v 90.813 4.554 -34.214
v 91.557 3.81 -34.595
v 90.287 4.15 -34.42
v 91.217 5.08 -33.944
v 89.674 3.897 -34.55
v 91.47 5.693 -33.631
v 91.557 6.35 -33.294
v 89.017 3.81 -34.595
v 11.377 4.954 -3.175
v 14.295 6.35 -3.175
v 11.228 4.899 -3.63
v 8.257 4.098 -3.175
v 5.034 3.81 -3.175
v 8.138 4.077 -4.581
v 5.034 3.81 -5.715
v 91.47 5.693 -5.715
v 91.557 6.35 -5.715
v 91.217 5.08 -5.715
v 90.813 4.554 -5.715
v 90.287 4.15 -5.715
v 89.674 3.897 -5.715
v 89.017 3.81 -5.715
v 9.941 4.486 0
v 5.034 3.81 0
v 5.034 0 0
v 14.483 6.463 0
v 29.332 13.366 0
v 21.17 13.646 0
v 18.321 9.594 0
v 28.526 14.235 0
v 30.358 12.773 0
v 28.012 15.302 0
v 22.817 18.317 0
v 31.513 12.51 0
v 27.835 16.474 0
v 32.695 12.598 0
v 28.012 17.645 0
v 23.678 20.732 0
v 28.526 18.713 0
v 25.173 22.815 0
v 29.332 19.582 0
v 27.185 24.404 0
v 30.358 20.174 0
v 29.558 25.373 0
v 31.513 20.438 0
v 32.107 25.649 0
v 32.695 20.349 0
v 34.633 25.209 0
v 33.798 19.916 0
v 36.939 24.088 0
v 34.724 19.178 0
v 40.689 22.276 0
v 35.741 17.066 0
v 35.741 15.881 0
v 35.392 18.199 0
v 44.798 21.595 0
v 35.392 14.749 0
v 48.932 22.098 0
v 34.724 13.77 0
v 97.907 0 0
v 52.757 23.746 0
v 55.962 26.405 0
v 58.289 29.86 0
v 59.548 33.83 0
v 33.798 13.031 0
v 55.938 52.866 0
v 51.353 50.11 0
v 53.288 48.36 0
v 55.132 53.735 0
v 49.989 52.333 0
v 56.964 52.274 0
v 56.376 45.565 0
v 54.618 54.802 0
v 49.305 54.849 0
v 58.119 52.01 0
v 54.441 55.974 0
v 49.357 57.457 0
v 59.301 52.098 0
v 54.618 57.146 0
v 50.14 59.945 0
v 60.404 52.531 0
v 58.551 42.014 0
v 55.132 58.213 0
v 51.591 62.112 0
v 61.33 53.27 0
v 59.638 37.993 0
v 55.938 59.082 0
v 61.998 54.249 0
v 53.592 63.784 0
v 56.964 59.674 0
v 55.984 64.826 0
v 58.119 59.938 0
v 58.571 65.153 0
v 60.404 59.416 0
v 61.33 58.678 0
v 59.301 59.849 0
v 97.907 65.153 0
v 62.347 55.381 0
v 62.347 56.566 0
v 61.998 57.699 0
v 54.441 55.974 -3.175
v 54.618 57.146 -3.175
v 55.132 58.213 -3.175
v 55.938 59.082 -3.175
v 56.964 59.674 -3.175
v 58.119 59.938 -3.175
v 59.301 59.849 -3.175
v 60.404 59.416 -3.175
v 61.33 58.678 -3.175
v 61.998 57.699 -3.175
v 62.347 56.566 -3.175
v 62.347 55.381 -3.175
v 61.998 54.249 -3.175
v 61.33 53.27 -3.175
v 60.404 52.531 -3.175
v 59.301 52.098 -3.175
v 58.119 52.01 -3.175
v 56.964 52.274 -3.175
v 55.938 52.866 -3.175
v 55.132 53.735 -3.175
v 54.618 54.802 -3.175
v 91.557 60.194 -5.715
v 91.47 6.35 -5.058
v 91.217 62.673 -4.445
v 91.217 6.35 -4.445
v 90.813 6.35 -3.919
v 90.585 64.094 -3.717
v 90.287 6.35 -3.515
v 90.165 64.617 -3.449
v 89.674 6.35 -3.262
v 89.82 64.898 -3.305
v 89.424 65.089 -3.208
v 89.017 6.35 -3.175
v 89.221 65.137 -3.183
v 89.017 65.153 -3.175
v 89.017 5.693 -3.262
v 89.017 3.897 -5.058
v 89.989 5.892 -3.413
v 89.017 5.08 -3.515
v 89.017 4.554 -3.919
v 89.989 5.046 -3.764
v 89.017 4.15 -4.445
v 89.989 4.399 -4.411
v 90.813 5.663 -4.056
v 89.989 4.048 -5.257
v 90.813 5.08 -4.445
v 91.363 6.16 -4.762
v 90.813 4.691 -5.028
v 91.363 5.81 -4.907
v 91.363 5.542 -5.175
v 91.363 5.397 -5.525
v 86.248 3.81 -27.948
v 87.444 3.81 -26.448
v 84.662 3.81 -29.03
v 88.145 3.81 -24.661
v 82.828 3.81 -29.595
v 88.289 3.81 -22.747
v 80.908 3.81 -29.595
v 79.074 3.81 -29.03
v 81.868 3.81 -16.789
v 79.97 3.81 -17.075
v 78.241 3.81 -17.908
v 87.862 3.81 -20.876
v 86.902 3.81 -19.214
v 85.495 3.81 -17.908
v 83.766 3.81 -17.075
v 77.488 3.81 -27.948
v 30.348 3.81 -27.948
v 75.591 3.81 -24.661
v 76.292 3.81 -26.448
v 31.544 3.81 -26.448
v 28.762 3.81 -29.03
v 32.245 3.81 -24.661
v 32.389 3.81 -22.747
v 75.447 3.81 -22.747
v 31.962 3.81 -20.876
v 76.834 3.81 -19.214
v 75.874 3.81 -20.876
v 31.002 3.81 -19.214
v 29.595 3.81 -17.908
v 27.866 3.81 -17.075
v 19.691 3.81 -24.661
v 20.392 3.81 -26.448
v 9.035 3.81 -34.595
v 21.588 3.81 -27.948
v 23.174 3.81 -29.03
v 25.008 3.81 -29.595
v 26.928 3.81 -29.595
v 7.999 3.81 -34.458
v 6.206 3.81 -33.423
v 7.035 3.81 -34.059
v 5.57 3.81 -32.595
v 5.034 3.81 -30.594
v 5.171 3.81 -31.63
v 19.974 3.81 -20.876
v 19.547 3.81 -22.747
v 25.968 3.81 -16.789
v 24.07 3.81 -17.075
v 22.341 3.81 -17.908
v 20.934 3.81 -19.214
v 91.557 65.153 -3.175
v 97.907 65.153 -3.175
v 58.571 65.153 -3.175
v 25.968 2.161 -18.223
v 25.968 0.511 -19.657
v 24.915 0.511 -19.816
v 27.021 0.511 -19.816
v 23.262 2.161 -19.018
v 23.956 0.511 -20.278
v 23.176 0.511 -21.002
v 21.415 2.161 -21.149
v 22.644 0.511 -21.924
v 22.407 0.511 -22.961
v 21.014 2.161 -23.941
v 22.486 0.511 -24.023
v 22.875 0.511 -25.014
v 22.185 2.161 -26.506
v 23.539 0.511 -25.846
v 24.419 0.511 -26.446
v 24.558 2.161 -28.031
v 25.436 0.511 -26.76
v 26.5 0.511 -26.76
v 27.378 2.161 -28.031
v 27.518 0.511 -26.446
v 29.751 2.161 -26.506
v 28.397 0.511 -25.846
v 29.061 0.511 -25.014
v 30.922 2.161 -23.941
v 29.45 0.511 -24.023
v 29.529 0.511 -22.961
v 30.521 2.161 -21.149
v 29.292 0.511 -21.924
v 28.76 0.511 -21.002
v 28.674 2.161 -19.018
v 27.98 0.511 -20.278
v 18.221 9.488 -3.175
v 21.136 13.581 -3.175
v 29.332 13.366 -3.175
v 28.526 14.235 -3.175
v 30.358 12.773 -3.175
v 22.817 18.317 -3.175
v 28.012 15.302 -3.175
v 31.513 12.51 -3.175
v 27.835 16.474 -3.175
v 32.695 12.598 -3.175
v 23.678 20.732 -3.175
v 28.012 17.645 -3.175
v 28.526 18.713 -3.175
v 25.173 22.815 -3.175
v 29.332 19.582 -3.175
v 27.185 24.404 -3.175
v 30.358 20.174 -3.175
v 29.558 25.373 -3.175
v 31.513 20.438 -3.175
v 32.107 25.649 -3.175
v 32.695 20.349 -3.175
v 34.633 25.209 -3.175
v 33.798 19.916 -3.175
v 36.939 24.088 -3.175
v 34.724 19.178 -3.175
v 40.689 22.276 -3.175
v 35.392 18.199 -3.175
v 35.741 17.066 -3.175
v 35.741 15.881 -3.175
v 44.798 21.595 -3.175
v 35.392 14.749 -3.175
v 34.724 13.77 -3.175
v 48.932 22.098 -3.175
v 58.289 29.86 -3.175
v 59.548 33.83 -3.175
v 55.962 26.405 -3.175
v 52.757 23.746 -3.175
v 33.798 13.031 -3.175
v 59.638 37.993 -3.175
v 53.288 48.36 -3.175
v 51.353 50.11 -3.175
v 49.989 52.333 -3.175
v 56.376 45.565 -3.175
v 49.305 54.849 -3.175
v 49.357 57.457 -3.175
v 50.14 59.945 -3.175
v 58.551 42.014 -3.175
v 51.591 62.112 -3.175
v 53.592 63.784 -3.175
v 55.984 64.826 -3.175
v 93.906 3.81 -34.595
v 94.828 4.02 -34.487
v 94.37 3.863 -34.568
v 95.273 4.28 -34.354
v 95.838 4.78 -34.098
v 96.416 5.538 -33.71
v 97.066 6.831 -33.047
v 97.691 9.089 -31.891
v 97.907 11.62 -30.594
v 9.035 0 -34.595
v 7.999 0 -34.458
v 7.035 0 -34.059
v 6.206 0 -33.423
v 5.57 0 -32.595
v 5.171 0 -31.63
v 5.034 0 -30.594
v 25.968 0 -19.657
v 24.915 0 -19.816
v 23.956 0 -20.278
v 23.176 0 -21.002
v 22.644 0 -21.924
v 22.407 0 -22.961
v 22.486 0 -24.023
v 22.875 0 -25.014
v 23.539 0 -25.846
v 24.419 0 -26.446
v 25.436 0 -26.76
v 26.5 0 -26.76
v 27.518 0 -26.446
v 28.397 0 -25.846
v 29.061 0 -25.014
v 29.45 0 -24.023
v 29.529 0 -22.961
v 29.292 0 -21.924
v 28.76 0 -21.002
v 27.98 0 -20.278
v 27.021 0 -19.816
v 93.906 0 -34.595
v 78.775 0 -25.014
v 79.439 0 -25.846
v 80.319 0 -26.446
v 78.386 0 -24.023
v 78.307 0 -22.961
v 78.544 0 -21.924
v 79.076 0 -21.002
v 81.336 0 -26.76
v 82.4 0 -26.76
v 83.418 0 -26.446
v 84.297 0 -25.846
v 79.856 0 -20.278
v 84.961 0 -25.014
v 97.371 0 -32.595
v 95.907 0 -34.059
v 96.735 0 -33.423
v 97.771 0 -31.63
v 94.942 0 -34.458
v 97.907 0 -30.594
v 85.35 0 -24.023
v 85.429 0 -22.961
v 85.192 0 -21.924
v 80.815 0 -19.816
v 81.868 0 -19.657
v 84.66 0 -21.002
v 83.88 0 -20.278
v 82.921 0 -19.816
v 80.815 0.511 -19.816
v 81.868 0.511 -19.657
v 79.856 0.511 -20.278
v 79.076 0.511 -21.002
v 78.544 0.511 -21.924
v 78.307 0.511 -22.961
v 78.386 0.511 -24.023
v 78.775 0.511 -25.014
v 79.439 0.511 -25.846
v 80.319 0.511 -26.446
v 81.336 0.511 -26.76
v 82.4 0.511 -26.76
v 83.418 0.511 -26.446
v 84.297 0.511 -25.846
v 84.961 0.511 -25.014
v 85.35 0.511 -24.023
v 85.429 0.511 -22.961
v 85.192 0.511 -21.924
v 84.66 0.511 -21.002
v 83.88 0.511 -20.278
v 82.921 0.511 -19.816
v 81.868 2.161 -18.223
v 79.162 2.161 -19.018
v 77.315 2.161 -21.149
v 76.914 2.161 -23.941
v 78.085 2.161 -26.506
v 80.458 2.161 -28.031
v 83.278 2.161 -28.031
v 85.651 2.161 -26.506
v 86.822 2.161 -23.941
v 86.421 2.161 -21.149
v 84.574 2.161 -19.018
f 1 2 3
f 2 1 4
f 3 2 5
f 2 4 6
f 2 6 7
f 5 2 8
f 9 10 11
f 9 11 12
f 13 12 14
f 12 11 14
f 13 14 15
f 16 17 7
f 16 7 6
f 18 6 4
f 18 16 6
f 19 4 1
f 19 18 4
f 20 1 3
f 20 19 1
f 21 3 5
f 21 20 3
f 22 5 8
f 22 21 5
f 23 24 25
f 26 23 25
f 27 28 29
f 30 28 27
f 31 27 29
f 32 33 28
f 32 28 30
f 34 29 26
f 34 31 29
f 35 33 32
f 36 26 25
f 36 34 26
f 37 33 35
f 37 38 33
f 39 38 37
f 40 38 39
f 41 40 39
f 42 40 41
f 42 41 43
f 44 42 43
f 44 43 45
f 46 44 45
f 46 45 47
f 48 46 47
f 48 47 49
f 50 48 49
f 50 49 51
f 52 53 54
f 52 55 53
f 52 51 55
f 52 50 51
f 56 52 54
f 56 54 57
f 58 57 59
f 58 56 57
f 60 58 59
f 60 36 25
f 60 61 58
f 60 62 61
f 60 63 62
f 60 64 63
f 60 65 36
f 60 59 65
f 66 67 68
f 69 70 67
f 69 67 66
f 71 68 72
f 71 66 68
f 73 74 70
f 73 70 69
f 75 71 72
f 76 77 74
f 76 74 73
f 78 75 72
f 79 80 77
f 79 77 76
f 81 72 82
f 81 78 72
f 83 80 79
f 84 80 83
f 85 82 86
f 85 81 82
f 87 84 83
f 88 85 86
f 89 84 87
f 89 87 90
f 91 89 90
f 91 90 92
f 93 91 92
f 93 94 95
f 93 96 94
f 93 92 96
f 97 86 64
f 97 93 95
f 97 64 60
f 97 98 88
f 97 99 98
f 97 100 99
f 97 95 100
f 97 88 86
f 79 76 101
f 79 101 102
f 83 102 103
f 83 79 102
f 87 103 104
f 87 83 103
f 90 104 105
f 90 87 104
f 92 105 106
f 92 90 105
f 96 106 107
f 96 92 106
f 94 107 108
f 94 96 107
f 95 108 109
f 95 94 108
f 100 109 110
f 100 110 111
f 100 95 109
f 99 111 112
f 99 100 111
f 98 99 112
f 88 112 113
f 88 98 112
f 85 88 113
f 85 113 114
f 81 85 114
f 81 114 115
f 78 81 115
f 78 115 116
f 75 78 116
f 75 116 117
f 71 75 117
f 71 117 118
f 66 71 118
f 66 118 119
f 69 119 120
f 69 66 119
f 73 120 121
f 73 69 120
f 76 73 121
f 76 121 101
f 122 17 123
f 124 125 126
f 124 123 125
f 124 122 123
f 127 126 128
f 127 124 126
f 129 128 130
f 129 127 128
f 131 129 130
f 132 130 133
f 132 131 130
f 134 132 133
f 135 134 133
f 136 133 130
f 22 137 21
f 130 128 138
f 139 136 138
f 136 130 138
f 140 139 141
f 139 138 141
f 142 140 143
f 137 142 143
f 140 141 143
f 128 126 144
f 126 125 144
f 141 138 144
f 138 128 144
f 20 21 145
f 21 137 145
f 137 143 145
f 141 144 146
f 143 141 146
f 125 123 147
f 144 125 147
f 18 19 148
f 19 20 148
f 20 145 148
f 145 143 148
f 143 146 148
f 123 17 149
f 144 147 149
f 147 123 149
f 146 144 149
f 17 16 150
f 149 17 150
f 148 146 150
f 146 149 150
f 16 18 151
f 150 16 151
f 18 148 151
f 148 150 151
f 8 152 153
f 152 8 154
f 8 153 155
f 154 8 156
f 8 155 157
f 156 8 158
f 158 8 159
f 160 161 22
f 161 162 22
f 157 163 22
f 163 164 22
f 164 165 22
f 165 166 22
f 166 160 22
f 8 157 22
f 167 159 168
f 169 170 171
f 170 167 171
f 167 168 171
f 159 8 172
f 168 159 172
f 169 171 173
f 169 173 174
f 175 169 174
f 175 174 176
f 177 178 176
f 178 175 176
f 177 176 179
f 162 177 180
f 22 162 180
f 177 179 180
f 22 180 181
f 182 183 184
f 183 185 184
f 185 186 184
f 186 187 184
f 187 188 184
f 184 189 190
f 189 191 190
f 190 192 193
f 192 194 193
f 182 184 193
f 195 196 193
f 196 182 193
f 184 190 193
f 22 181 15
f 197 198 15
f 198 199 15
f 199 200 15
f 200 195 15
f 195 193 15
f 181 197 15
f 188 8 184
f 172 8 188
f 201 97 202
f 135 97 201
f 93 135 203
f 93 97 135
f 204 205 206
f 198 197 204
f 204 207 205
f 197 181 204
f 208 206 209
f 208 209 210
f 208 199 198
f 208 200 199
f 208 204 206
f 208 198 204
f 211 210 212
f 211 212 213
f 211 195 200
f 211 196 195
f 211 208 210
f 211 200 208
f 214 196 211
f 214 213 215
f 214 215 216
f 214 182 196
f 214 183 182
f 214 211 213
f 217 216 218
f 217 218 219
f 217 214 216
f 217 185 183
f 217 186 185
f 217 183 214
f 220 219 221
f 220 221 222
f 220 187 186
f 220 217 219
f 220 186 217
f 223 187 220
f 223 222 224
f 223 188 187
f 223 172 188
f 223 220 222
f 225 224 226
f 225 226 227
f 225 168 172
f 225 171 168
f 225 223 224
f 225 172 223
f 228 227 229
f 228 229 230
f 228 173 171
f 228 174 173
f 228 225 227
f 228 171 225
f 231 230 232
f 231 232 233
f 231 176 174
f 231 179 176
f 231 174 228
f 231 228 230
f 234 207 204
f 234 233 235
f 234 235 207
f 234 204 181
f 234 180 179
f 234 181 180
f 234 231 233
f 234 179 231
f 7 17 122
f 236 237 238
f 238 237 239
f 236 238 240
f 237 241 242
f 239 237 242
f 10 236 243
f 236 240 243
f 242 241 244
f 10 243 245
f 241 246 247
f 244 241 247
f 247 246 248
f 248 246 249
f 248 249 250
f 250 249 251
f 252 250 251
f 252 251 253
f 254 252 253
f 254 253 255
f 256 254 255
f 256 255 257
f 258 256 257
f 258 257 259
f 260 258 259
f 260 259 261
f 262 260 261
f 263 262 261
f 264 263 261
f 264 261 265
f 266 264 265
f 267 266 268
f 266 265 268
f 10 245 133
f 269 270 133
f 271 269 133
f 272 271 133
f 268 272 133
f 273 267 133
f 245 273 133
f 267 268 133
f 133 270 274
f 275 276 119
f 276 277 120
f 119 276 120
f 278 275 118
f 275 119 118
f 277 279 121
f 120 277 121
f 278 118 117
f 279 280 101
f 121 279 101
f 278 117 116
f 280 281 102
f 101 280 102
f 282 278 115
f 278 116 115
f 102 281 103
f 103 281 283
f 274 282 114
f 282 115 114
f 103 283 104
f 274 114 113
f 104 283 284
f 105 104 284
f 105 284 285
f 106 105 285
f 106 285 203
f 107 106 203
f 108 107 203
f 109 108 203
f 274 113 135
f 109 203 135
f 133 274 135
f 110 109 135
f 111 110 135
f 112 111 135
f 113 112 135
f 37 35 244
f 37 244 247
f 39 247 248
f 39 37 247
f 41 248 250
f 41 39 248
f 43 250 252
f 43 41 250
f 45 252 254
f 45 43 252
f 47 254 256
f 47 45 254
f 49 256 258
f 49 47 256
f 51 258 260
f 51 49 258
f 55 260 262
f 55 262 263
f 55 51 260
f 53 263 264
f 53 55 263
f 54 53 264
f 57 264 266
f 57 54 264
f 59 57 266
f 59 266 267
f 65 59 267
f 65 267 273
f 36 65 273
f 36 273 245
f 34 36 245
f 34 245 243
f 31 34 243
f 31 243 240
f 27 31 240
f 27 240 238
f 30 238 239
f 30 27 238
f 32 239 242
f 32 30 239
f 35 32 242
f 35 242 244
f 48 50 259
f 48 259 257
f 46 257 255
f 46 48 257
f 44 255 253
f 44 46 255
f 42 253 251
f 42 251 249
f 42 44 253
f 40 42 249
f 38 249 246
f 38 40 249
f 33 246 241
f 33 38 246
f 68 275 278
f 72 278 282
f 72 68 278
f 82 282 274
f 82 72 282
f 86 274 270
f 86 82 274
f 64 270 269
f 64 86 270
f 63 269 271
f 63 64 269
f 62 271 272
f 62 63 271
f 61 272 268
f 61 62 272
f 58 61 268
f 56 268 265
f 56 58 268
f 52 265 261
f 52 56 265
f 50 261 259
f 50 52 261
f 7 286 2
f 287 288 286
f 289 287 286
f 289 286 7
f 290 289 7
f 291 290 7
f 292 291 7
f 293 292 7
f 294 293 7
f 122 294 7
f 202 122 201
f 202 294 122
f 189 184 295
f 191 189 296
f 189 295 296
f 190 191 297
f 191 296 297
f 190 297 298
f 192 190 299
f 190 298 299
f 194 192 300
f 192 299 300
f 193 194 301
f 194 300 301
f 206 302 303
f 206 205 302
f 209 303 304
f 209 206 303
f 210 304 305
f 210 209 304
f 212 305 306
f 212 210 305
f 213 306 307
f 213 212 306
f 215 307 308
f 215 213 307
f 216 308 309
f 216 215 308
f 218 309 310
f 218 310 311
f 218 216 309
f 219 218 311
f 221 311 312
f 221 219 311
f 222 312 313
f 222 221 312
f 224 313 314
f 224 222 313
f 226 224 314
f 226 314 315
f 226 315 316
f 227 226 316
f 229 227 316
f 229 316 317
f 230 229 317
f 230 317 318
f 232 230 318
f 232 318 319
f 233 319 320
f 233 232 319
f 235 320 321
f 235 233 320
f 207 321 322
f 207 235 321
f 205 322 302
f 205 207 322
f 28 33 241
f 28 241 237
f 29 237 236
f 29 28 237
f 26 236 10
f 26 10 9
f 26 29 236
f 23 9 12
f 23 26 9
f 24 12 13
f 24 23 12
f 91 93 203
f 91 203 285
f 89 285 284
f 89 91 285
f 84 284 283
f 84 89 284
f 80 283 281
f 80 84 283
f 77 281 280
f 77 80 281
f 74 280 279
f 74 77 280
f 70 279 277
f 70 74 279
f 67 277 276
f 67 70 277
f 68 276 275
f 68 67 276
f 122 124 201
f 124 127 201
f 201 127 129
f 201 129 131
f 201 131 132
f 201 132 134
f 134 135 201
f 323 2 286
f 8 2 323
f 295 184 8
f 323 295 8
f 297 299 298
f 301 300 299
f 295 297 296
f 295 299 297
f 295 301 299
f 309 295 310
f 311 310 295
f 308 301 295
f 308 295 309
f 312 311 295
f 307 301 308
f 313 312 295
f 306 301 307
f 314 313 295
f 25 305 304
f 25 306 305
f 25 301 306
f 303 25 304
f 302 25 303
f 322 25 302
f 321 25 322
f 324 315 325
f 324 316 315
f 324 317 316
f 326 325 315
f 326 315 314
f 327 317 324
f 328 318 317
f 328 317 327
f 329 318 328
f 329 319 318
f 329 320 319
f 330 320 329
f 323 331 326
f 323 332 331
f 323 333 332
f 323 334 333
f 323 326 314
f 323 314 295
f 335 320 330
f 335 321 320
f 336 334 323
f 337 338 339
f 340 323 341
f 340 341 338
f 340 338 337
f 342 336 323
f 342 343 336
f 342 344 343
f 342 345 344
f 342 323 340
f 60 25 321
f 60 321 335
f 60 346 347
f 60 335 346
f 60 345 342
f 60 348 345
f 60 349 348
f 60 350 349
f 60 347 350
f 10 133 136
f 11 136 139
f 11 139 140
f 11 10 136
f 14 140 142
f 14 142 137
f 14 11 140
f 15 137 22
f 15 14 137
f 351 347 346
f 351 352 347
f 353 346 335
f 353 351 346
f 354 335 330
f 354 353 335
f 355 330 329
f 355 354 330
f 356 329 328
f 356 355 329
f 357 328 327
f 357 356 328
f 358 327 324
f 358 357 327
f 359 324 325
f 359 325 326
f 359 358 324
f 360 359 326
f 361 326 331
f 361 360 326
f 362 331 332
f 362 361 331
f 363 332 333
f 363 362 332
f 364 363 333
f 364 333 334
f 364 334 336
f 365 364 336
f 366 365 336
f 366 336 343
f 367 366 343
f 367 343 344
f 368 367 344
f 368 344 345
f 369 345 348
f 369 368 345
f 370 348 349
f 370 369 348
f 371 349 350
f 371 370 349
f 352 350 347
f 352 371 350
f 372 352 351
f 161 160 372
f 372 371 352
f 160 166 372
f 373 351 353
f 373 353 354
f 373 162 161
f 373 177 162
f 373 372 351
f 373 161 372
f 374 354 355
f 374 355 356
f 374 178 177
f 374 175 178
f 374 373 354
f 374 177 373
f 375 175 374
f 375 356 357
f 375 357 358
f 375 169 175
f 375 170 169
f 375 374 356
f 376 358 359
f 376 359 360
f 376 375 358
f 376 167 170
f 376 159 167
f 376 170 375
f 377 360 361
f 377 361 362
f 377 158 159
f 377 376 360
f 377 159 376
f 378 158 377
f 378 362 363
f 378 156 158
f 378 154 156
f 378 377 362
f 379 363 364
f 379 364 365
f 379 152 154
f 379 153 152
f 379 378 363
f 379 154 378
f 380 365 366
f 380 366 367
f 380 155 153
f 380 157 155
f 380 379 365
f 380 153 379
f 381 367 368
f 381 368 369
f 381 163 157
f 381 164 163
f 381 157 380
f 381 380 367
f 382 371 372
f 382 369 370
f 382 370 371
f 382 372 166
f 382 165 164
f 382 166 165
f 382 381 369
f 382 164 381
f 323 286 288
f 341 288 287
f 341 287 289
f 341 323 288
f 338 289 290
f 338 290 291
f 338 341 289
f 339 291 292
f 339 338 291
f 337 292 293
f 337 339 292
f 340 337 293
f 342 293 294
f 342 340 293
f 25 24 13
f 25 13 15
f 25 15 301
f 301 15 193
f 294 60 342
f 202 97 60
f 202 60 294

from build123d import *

# Parameters (mm, degrees)
SKETCH2_W                                   = 101.6
SKETCH2_H                                   = 127
BOSS_EXTRUDE1_DEPTH                         = 3.175
SKETCH5_R                                   = 3.9751
CUT_EXTRUDE1_DEPTH                          = 3.175
BOSS_EXTRUDE3_DEPTH                         = 92.87256
BOSS_EXTRUDE4_DEPTH                         = 6.35
SKETCH18_R                                  = 3.175
CUT_EXTRUDE3_DEPTH                          = 6.8072
FILLET4_R                                   = 4.0005
CUT_EXTRUDE4_DEPTH                          = 34.5948
CUT_EXTRUDE5_DEPTH                          = 2.9972
FILLET7_R                                   = 2.54
CSK_FOR_1_4_FLAT_HEAD_MACHINE_SCREW_2_COUNT = 2
CSK_FOR_1_4_FLAT_HEAD_MACHINE_SCREW_2_PITCH = 55.9


with BuildPart() as part:
    # Sketch2 → Boss-Extrude1 (new body)
    with BuildSketch(Plane.XY):
        with Locations((50.8, 63.5)):
            Rectangle(SKETCH2_W, SKETCH2_H)
    extrude(amount=BOSS_EXTRUDE1_DEPTH)

    # Sketch5 → Cut-Extrude1 (cut)
    with BuildSketch(Plane(origin=(0, 0, 0), x_dir=(-1, 0, 0), z_dir=(0, 0, -1))):
        with BuildLine():
            Line((-81.586228812, 65.152573183), (-58.571239337, 65.152573183))
            ThreePointArc((-58.571239337, 65.152573183), (-49.65943867, 58.729036089), (-53.287760408, 48.359981104))
            ThreePointArc((-53.287760408, 48.359981104), (-57.249364207, 28.049269577), (-36.93865268, 24.087665778))
            ThreePointArc((-36.93865268, 24.087665778), (-28.337713232, 24.971703827), (-22.817162059, 18.317291951))
            ThreePointArc((-22.817162059, 18.317291951), (-16.509170131, 7.896881921), (-5.03428, 3.81))
            Line((-5.03428, 3.81), (-5.03428, 0))
            Line((-5.03428, 0), (0, 0))
            Line((0, 0), (0, 127))
            Line((0, 127), (-101.6, 127))
            Line((-101.6, 127), (-101.6, 0))
            Line((-101.6, 0), (-97.90684, 0))
            Line((-97.90684, 0), (-97.90684, 65.152573183))
            Line((-97.90684, 65.152573183), (-81.586228812, 65.152573183))
        make_face()
        with Locations((-58.416247506, 55.973867932)):
            Circle(SKETCH5_R)
        with Locations((-31.810165582, 16.473778949)):
            Circle(SKETCH5_R)
    extrude(amount=-CUT_EXTRUDE1_DEPTH, mode=Mode.SUBTRACT)

    # Sketch10 → Boss-Extrude3 (add)
    with BuildSketch(Plane(origin=(5.03428, 0, 0), x_dir=(0, 0, -1), z_dir=(1, 0, 0))):
        Polygon((-3.175, 0), (-4.2418, 0), (-4.2418, -2.9972), (-34.5948, -2.9972), (-34.5948, 0), (-34.5948, 3.81), (-3.175, 3.81), align=None)
    extrude(amount=BOSS_EXTRUDE3_DEPTH)

    # Sketch11 → Boss-Extrude4 (add)
    with BuildSketch(Plane(origin=(97.90684, 0, 0), x_dir=(0, 0, -1), z_dir=(1, 0, 0))):
        Polygon((-3.175, 65.152573183), (-3.175, 3.81), (-34.5948, 3.81), align=None)
    extrude(amount=-BOSS_EXTRUDE4_DEPTH)

    # Sketch18 → Cut-Extrude3 (cut)
    with BuildSketch(Plane.XZ.offset(2.9972)):
        with Locations(Location((25.968032816, 23.228300068, 0), (0, 0, 270))):
            Circle(SKETCH18_R)
        with Locations(Location((81.868032816, 23.228300068, 0), (0, 0, 270))):
            Circle(SKETCH18_R)
    extrude(amount=-CUT_EXTRUDE3_DEPTH, mode=Mode.SUBTRACT)

    # Fillet4
    fillet4_edges = [part.edges().sort_by_distance(p)[0] for p in [
        (97.90684, -1.4986, 4.2418),
        (5.03428, -1.4986, 4.2418),
        (97.90684, 0.4064, 34.5948),
        (5.03428, 0.4064, 34.5948),
    ]]
    fillet(fillet4_edges, radius=FILLET4_R)

    # Mirror5: part across plane


with BuildPart() as part_1:
    add(part.part)
    add(part.part.mirror(Plane.XY))

    # Sketch25 → Cut-Extrude4 (cut)
    with BuildSketch(Plane.XY):
        Polygon((105.475480197, -15.241589329), (106.840773124, 71.833759528), (-8.541984089, 73.642896836), (-9.907277015, -13.432452021), align=None)
    extrude(amount=CUT_EXTRUDE4_DEPTH, mode=Mode.SUBTRACT)

    # Sketch28 → Cut-Extrude5 (cut)
    with BuildSketch(Plane.XZ.offset(2.9972)):
        with BuildLine():
            Line((93.90634, -4.2418), (9.03478, -4.2418))
            ThreePointArc((9.03478, -4.2418), (6.205999322, -5.413519322), (5.03428, -8.2423))
            Line((5.03428, -8.2423), (5.03428, -30.5943))
            ThreePointArc((5.03428, -30.5943), (6.205999322, -33.423080678), (9.03478, -34.5948))
            Line((9.03478, -34.5948), (93.90634, -34.5948))
            ThreePointArc((93.90634, -34.5948), (96.735120678, -33.423080678), (97.90684, -30.5943))
            Line((97.90684, -30.5943), (97.90684, -8.2423))
            ThreePointArc((97.90684, -8.2423), (96.735120678, -5.413519322), (93.90634, -4.2418))
        make_face()
    extrude(amount=-CUT_EXTRUDE5_DEPTH, mode=Mode.SUBTRACT)

    # Fillet7
    # the kernel refuses this fillet: 2.54 mm, written as the material it adds along each edge
    with BuildSketch(Plane(origin=(89.01684, 6.35, -5.715), x_dir=(0, -1, 0), z_dir=(1, 0, 0))) as fillet7_piece_1_section:
        Polygon((0, 0), (FILLET7_R, 0), (FILLET7_R, -FILLET7_R), (0, -FILLET7_R), align=None)
    fillet7_piece_1 = extrude(amount=FILLET7_R, mode=Mode.PRIVATE)
    fillet7_piece_1 = fillet7_piece_1 - Plane(origin=(89.01684, 6.35, -5.715), x_dir=(0, 0.7071067811865475, -0.7071067811865477), z_dir=(1, 0, 0)) * Sphere(FILLET7_R, mode=Mode.PRIVATE)
    add(fillet7_piece_1)
    with BuildSketch(Plane(origin=(5.03428, 3.81, -3.175), x_dir=(0, 0, -1), z_dir=(1, 0, 0))) as fillet7_piece_2_section:
        with BuildLine():
            CenterArc((FILLET7_R, FILLET7_R), FILLET7_R, 180, 90)
            Line((0, FILLET7_R), (0, 0))
            Line((0, 0), (FILLET7_R, 0))
        make_face()
    fillet7_piece_2 = extrude(amount=83.98256, mode=Mode.PRIVATE)
    fillet7_piece_2 = fillet7_piece_2 - Plane(origin=(5.03428, 21.962678524, -3.760034689), x_dir=(0.9796285454928902, -0.20081810888334822, 0), z_dir=(0, 0, -1)) * Cylinder(18.152678524, 179, mode=Mode.PRIVATE)
    add(fillet7_piece_2)
    with BuildSketch(Plane(origin=(91.55684, 3.81, -5.715), x_dir=(-1, 0, 0), z_dir=(0, 0, -1))) as fillet7_piece_3_section:
        with BuildLine():
            CenterArc((FILLET7_R, FILLET7_R), FILLET7_R, 180, 90)
            Line((0, FILLET7_R), (0, 0))
            Line((0, 0), (FILLET7_R, 0))
        make_face()
    fillet7_piece_3 = extrude(amount=28.8798, mode=Mode.PRIVATE)
    fillet7_piece_3 = split(fillet7_piece_3, bisect_by=Plane(origin=(90.978646613, 10.179733651, -31.332208508), z_dir=(0, -0.4558808495345019, 0.8900408142482573)), keep=Keep.TOP, mode=Mode.PRIVATE)
    add(fillet7_piece_3)
    with BuildSketch(Plane(origin=(91.55684, 65.152573183, -3.175), x_dir=(0, 0, -1), z_dir=(0, -1, 0))) as fillet7_piece_4_section:
        with BuildLine():
            CenterArc((FILLET7_R, -FILLET7_R), FILLET7_R, 90, 90)
            Line((0, -FILLET7_R), (0, 0))
            Line((0, 0), (FILLET7_R, 0))
        make_face()
    fillet7_piece_4 = extrude(amount=58.802573183, mode=Mode.PRIVATE)
    fillet7_piece_4 = split(fillet7_piece_4, bisect_by=Plane(origin=(90.975846211, 41.193986982, -15.446640195), z_dir=(0, -0.4558808495345019, 0.8900408142482573)), keep=Keep.TOP, mode=Mode.PRIVATE)
    add(fillet7_piece_4)

    # Sketch35 → CSK for 1/4 Flat Head Machine Screw (100)1 (revolve, cut)
    with BuildSketch(Plane(origin=(25.968032816, 3.81, -23.228300068), x_dir=(0, 0, 1), z_dir=(1, 0, 0))):
        Polygon((0, 0), (0, 3.81), (3.57124, 3.81), (3.57124, 3.298865467), (6.4389, 0), align=None)
    csk_for_1_4_flat_head_machine_screw_100 = revolve(axis=Axis((25.968032816, 10.16, -23.228300068), (0, -1, 0)), mode=Mode.SUBTRACT)

    # CSK for 1_4 Flat Head Machine Screw  2: CSK for 1/4 Flat Head Machine Screw (100)1 ×2
    with Locations(*[(i * CSK_FOR_1_4_FLAT_HEAD_MACHINE_SCREW_2_PITCH, 0, 0) for i in range(1, CSK_FOR_1_4_FLAT_HEAD_MACHINE_SCREW_2_COUNT)]):
        add(csk_for_1_4_flat_head_machine_screw_100, mode=Mode.SUBTRACT)


solid = part_1.part
